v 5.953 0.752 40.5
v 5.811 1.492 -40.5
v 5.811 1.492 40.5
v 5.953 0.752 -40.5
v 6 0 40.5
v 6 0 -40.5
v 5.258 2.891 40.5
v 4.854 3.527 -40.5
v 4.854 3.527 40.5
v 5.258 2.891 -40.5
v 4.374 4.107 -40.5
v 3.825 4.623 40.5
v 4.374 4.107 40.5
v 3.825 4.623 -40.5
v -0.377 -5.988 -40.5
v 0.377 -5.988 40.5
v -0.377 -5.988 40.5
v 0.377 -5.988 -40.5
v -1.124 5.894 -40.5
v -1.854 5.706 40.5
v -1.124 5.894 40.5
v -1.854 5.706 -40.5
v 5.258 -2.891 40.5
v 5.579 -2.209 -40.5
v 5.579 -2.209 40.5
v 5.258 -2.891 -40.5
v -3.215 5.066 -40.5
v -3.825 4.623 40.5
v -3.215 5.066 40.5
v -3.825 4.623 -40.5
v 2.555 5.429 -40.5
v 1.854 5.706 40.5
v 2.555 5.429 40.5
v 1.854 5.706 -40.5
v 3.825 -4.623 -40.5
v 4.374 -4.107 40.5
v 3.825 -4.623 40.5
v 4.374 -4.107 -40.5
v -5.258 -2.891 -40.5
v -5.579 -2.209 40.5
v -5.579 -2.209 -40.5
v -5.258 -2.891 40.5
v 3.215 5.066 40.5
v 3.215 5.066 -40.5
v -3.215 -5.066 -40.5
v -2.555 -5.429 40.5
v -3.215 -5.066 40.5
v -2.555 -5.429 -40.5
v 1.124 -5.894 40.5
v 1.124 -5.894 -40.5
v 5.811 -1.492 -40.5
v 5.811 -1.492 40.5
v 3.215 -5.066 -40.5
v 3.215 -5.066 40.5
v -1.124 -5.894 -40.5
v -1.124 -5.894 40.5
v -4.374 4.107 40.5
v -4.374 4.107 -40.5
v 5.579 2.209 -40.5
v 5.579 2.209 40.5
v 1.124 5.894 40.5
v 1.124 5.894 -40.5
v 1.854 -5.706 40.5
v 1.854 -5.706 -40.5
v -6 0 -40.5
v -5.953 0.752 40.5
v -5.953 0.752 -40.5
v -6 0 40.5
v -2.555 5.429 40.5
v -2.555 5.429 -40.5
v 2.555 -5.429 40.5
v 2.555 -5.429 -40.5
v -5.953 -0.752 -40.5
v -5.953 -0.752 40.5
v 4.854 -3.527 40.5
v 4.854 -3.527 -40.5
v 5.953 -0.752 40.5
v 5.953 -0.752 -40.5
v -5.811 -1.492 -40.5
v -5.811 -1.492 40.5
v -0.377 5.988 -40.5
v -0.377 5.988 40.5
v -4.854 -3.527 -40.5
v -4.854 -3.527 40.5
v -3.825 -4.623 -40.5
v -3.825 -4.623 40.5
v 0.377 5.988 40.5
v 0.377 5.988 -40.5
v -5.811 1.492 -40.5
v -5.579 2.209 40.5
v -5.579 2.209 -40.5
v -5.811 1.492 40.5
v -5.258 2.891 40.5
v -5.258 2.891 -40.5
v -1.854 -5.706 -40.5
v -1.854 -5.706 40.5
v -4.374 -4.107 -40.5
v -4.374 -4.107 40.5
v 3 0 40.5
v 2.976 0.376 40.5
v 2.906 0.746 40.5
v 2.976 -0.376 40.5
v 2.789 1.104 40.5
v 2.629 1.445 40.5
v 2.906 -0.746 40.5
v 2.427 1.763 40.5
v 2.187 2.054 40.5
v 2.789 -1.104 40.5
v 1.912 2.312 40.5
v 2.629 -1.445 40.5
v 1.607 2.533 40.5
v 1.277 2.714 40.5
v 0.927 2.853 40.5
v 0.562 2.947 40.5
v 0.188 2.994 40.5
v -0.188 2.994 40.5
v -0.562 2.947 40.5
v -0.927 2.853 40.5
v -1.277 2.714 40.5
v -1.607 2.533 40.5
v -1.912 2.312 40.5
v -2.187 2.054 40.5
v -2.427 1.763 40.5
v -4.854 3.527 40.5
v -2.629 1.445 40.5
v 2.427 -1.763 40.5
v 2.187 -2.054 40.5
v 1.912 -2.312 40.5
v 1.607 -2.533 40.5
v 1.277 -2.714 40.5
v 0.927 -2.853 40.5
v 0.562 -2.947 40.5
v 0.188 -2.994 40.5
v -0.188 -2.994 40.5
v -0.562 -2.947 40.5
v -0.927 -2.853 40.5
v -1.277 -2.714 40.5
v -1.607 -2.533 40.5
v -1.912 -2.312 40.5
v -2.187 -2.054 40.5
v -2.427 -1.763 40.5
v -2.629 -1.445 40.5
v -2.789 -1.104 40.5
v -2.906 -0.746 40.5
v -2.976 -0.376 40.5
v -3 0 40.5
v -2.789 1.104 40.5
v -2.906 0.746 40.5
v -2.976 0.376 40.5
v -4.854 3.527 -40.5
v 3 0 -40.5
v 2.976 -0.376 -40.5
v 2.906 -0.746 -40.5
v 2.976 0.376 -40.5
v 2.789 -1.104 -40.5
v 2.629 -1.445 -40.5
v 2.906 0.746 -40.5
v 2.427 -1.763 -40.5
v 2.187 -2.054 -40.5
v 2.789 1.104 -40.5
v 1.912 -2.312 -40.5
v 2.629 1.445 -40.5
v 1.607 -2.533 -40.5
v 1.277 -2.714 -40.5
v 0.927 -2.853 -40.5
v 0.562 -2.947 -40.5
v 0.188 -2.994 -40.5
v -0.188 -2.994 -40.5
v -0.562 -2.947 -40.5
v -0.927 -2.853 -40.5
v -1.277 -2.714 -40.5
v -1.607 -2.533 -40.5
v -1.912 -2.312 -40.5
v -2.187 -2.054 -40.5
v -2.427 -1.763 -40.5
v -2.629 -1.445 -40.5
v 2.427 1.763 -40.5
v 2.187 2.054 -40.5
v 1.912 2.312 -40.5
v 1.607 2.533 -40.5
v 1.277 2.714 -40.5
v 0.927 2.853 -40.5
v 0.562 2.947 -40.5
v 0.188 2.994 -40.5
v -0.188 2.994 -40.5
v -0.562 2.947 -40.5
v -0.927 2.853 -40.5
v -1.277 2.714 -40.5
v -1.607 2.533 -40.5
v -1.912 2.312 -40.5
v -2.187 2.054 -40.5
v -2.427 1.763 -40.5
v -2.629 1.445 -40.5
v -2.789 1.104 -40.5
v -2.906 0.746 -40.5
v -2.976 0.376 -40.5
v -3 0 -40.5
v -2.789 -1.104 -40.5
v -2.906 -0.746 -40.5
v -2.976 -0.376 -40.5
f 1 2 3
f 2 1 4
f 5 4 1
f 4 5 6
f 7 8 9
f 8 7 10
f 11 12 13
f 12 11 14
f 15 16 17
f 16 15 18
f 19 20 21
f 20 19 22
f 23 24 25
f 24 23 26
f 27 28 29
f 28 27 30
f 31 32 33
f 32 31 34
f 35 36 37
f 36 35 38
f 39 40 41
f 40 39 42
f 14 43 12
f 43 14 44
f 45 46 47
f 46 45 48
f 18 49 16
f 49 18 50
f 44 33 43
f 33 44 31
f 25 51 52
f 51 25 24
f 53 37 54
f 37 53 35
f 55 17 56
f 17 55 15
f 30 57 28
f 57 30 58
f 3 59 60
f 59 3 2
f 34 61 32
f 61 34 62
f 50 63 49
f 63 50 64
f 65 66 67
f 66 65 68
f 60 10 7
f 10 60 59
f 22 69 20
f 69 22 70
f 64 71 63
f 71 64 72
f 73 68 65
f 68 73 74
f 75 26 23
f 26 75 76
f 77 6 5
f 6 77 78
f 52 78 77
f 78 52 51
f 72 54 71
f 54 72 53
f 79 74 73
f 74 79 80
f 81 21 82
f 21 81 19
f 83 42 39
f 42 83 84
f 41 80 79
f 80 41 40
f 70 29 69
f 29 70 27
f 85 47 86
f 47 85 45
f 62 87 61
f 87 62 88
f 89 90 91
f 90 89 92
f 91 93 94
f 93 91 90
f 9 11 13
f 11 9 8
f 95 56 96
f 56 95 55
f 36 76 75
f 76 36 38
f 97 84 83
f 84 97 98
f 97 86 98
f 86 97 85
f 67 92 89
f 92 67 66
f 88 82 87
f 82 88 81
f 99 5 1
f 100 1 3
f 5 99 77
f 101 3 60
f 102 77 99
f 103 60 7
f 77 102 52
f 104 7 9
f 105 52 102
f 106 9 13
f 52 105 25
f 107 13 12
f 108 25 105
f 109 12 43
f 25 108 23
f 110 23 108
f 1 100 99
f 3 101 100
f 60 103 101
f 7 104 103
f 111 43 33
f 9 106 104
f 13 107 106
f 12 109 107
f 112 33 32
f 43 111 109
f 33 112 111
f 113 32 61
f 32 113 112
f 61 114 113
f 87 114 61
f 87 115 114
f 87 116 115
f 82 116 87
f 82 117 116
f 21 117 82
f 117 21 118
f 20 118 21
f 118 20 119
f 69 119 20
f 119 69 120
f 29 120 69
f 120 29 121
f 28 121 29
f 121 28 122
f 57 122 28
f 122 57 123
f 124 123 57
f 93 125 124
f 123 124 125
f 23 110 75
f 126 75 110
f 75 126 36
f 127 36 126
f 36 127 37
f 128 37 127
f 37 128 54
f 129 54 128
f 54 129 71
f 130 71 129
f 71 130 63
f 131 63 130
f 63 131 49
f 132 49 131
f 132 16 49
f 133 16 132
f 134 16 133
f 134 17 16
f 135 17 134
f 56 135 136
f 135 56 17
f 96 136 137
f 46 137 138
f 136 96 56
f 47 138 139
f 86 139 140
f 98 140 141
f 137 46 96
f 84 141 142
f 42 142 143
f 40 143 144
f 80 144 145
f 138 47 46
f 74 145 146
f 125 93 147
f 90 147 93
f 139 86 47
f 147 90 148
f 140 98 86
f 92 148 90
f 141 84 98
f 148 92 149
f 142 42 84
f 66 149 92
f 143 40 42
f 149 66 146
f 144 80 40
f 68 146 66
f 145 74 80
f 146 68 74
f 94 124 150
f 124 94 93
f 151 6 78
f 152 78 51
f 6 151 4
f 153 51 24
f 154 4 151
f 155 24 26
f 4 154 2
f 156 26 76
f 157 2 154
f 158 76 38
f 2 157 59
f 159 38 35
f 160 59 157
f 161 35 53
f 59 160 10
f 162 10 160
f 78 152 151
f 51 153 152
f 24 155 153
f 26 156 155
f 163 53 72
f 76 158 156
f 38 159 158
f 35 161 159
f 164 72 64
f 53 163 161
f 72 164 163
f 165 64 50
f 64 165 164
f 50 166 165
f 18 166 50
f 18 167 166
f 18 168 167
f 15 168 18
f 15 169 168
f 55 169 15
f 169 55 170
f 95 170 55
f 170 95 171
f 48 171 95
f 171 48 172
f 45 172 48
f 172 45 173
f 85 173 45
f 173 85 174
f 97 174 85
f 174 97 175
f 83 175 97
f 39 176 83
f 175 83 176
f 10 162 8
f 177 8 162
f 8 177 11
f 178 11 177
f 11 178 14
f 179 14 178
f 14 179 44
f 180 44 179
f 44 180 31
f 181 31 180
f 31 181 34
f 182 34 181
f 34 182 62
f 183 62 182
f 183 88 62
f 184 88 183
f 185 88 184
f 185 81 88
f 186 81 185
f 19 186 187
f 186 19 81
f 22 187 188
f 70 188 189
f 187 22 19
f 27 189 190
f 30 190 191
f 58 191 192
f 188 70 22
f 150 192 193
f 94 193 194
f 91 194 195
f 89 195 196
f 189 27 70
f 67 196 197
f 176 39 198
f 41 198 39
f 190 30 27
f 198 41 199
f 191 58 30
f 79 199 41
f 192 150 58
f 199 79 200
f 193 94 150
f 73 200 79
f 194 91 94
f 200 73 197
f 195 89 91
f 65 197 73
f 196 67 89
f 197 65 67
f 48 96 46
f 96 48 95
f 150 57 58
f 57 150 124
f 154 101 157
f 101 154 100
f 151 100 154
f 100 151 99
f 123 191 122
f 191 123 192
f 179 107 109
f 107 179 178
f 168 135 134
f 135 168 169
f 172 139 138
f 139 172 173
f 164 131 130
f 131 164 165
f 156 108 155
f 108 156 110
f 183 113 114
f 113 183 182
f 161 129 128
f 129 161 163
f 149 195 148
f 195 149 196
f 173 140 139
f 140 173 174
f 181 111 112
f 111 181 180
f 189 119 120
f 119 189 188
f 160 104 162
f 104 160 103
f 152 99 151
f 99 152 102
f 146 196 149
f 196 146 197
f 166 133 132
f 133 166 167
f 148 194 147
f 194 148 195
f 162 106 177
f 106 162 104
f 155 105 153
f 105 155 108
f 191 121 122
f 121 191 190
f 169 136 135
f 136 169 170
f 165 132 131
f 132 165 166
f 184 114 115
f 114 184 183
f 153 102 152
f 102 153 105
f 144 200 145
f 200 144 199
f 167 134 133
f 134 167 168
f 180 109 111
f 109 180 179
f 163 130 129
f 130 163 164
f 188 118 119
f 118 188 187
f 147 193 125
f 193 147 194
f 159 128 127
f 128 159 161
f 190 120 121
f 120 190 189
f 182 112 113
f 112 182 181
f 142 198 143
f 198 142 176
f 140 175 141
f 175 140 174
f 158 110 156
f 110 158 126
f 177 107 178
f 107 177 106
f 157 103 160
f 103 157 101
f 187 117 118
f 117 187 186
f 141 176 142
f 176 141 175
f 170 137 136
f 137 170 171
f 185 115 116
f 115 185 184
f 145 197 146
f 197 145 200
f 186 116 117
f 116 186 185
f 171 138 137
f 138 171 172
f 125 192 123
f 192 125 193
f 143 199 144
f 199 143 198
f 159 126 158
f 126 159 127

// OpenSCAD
$fn = 50;


difference() {
	union() {
		translate(v = [0, 0, -40.5000000000]) {
			cylinder(h = 81, r = 6.0000000000);
		}
	}
	union() {
		translate(v = [0, 0, -100.0000000000]) {
			cylinder(h = 200, r = 3.0000000000);
		}
	}
}
